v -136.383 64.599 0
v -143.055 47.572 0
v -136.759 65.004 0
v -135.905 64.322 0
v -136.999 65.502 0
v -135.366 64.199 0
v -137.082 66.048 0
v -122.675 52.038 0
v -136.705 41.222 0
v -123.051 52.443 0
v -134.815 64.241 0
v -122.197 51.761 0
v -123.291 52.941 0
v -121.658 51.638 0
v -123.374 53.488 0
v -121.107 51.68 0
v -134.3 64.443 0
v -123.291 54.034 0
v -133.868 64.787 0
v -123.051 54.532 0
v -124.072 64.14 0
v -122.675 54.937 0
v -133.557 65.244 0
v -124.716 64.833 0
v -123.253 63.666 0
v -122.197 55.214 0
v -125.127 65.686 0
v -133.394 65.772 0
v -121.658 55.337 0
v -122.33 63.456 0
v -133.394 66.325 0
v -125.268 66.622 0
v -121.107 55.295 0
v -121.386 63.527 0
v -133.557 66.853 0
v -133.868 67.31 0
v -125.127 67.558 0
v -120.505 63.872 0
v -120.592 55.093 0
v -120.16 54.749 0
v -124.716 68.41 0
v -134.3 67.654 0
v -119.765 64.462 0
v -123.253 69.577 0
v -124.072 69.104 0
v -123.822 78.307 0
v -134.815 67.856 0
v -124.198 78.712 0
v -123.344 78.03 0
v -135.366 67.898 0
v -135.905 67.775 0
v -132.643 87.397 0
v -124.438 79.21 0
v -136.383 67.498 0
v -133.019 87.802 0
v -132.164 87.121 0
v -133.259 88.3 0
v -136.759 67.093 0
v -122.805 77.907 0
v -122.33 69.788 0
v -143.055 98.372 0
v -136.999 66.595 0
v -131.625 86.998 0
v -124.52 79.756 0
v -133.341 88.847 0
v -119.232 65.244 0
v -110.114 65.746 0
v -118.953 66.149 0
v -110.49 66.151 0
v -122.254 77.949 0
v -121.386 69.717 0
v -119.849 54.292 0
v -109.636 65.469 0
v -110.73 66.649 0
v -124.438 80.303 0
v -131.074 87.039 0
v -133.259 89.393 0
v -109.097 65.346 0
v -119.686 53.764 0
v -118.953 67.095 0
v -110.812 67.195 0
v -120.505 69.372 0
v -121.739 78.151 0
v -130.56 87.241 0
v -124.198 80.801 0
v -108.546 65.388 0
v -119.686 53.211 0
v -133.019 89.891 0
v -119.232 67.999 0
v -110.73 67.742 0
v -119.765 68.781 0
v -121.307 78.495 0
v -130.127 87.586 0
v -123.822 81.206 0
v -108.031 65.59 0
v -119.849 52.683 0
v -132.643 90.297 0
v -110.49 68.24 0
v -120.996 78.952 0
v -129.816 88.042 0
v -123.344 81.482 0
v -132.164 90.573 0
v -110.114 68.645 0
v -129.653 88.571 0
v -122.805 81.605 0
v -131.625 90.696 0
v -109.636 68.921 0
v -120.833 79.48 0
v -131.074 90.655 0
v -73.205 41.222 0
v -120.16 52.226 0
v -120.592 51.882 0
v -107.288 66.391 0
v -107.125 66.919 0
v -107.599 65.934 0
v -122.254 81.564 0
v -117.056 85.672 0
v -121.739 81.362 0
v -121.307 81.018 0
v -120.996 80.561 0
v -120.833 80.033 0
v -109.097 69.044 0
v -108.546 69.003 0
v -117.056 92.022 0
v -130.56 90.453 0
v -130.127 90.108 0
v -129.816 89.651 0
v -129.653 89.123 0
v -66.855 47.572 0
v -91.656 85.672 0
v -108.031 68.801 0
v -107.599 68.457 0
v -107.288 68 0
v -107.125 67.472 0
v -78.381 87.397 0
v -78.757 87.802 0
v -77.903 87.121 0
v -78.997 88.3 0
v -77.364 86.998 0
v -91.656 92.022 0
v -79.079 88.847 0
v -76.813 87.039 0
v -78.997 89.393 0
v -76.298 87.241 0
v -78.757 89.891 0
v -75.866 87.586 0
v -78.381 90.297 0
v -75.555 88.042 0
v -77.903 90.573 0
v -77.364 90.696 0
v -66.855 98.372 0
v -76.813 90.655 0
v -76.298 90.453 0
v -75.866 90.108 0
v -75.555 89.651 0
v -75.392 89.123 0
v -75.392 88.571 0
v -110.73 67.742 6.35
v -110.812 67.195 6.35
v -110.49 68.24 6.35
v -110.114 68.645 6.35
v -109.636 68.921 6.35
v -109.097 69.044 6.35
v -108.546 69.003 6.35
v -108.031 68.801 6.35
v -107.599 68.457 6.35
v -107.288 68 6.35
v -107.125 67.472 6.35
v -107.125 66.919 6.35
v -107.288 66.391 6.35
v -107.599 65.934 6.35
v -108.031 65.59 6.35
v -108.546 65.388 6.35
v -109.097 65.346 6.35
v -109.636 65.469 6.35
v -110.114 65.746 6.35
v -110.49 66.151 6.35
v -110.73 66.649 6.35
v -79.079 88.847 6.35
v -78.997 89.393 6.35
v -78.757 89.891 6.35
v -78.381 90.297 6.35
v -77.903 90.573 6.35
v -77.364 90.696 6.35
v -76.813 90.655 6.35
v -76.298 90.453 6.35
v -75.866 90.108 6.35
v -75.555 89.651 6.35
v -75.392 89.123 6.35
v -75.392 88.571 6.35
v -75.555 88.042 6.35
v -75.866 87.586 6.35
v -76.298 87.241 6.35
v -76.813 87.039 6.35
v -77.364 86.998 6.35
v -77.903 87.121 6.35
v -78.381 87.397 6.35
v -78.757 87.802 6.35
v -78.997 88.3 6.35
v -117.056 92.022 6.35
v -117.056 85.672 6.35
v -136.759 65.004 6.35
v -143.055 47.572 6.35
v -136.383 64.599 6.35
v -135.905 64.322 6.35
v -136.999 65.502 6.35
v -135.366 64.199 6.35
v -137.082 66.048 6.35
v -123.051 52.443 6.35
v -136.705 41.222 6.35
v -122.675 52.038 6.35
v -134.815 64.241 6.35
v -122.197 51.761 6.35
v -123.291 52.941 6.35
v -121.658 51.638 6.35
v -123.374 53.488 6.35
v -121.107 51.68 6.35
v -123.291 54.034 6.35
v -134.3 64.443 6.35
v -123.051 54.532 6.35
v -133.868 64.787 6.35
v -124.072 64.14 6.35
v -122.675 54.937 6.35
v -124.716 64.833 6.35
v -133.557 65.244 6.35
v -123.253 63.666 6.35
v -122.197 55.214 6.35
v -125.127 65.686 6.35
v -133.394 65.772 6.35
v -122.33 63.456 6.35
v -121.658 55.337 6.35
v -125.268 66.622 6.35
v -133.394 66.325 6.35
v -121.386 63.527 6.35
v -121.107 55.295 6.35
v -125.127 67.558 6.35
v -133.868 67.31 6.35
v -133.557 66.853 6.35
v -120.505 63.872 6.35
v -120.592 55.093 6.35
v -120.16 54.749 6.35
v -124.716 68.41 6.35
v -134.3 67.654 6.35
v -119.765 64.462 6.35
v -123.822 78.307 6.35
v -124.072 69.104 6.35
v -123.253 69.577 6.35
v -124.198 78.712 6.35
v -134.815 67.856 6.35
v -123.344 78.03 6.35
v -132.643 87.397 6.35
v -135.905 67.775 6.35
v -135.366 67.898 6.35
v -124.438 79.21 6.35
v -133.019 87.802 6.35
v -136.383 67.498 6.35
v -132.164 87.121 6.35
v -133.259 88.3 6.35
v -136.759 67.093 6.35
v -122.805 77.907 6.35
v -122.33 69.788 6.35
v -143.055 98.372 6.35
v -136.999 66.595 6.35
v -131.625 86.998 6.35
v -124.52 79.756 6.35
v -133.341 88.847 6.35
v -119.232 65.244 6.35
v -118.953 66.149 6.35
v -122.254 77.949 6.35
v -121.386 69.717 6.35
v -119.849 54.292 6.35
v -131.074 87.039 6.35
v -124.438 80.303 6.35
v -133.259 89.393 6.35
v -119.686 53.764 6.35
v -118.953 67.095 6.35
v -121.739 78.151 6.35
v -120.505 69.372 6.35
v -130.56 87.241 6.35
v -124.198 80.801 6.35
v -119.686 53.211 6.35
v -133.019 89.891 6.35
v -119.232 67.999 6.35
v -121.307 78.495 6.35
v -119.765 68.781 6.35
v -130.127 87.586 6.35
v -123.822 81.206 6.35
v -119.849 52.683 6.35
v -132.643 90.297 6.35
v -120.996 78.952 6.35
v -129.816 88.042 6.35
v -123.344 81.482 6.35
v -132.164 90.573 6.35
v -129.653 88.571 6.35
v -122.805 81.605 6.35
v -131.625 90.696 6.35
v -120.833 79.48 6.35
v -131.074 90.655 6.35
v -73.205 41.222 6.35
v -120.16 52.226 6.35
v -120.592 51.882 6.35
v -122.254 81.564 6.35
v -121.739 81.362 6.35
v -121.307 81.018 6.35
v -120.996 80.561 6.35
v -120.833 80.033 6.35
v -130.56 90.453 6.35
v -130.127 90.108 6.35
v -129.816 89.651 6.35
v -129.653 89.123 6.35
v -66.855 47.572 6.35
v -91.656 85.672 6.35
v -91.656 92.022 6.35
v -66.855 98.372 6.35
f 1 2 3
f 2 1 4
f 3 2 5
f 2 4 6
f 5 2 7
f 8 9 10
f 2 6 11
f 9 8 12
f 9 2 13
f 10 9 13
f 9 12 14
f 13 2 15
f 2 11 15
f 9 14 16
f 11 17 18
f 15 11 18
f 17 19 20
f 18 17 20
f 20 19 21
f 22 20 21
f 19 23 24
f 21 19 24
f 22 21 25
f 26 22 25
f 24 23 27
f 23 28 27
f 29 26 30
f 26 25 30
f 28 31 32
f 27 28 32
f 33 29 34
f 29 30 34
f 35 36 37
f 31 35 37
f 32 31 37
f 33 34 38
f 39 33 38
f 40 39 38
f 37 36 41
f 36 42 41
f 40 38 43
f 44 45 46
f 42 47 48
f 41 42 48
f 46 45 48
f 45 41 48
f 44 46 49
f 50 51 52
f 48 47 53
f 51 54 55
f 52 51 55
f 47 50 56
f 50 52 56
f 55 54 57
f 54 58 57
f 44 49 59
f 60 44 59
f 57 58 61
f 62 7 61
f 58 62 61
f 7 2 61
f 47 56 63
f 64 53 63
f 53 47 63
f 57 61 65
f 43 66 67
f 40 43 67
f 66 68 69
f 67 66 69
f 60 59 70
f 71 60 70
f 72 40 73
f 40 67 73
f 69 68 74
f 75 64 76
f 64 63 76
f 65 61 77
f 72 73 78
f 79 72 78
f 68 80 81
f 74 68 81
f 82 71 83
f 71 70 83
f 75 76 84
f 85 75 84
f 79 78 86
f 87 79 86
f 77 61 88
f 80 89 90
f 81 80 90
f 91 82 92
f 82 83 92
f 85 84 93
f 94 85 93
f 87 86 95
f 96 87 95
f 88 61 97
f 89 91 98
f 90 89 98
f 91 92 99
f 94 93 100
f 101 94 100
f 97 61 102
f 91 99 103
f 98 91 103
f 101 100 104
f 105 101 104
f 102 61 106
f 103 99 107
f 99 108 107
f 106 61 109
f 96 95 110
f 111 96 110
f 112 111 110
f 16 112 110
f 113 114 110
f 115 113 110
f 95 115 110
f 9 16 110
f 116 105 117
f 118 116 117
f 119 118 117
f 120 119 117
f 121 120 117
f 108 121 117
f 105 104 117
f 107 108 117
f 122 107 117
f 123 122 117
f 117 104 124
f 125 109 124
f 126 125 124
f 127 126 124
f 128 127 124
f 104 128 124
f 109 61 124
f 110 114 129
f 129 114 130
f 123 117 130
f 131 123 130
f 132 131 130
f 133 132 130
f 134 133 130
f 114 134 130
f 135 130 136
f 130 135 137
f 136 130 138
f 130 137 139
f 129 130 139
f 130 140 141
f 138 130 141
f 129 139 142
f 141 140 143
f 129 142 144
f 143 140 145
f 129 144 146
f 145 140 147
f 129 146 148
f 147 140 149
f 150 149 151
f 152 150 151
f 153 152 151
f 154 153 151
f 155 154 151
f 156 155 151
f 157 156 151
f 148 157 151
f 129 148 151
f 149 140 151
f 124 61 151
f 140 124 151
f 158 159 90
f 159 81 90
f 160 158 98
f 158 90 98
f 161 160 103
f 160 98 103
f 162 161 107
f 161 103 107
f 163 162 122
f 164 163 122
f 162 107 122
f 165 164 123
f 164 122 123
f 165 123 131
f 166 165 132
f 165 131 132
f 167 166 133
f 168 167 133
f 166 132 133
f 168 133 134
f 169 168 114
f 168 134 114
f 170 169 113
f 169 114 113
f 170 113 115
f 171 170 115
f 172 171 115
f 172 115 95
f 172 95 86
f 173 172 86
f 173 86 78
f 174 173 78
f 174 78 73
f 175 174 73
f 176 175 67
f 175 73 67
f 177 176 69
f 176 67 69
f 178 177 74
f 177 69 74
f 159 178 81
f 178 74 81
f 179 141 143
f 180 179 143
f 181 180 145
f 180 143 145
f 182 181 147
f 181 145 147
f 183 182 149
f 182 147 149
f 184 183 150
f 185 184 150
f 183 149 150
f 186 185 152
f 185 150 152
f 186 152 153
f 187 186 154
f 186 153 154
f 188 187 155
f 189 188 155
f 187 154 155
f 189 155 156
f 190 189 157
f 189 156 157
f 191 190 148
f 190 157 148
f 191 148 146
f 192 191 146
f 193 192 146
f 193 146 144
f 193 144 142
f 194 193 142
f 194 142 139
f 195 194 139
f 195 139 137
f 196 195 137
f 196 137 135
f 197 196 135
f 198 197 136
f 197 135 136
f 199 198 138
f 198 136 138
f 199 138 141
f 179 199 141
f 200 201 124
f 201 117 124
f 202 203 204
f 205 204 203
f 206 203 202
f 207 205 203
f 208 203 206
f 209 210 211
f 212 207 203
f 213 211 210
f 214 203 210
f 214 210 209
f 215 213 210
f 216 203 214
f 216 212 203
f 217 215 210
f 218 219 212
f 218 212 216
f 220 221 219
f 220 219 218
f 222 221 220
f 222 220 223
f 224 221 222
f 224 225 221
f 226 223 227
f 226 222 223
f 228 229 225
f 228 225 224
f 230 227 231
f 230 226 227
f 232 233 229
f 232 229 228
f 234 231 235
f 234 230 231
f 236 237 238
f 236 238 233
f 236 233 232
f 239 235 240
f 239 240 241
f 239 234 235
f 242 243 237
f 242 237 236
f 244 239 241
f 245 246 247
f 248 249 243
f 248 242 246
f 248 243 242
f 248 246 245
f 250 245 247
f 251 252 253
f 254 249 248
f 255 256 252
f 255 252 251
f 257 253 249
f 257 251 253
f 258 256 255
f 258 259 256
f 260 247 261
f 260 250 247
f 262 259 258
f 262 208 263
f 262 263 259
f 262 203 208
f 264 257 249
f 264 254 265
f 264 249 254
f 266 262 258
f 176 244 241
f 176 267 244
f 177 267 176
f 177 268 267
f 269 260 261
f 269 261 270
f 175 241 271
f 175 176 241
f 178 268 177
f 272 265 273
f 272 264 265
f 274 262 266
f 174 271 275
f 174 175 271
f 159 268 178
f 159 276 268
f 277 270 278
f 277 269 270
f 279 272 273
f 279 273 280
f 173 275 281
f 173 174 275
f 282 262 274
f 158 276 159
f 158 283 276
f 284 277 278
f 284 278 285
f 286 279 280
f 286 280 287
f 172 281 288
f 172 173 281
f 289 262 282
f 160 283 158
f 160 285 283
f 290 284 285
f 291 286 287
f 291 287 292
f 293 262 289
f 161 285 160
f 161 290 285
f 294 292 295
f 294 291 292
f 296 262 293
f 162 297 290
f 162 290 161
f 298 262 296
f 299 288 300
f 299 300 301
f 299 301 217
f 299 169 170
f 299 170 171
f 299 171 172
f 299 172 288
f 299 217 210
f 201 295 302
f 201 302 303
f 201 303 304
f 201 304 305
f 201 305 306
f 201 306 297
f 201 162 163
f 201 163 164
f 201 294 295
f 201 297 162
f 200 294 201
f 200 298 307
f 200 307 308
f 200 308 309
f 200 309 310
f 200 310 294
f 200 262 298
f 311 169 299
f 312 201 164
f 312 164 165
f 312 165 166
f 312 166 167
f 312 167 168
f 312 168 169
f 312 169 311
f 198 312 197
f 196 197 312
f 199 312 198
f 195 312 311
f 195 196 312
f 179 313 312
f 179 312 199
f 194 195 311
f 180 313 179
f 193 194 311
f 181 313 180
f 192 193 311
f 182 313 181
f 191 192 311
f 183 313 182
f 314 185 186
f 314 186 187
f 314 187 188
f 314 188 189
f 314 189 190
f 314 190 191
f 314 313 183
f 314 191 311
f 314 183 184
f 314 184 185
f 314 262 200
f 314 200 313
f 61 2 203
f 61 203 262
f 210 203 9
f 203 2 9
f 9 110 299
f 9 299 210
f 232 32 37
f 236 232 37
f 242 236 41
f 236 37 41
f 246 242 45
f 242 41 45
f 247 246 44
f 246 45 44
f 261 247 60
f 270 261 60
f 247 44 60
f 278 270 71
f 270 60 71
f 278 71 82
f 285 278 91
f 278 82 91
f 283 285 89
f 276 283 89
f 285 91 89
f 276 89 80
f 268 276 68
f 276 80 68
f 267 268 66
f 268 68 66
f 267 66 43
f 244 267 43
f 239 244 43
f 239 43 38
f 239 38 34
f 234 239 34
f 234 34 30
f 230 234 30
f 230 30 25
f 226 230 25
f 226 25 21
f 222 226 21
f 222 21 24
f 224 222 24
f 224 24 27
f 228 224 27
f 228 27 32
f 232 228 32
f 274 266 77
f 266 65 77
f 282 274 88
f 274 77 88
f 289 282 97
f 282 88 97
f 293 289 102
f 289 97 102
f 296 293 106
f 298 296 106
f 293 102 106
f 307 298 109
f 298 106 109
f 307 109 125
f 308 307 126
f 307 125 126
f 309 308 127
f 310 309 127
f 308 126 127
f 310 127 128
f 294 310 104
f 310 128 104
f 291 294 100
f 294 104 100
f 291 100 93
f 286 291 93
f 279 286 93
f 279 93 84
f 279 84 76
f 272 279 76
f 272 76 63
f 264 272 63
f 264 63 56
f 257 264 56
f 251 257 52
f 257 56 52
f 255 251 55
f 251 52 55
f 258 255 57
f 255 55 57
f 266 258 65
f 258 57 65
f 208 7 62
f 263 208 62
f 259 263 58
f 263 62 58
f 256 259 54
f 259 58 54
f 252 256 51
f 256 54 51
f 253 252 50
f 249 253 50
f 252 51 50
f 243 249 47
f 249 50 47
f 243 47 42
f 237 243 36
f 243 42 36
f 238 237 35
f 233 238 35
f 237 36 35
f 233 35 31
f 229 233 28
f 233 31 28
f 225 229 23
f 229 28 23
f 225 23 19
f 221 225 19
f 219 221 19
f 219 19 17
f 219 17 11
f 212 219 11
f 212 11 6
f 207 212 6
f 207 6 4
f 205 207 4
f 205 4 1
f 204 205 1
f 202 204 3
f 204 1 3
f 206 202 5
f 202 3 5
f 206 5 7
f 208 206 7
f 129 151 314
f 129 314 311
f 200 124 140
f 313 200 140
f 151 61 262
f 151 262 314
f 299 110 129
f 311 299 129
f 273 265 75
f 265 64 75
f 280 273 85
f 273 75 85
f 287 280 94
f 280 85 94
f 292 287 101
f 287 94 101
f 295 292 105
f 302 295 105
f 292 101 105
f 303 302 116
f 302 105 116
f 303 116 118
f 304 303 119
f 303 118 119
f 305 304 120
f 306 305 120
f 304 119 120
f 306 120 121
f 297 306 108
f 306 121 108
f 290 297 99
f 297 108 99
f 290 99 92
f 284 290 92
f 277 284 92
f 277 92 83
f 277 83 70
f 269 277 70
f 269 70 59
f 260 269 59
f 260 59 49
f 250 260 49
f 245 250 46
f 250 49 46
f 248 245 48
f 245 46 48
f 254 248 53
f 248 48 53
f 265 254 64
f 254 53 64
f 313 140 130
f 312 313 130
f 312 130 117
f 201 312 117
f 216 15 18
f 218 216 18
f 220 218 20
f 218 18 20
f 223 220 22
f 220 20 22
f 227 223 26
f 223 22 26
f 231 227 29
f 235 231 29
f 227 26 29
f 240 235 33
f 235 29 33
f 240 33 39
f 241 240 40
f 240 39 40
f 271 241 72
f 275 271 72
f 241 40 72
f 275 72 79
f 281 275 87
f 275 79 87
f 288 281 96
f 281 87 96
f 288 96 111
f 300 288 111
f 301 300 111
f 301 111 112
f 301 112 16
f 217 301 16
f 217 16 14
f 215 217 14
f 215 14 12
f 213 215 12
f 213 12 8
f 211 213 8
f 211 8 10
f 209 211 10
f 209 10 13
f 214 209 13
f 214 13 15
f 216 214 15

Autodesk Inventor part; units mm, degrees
ref_plane "YZ Plane" through (0, 0, 0) normal (1, 0, 0) x (0, 1, 0)
ref_plane "XZ Plane" through (0, 0, 0) normal (0, 1, 0) x (-1, 0, 0)
ref_plane "XY Plane" through (0, 0, 0) normal (0, 0, 1) x (1, 0, 0)
sketch "Sketch1" plane through (0, 0, 0) normal (0, 0, 1) x (1, 0, 0)
  line L0 (-73.2051, 41.2219) -> (-136.7051, 41.2219)
  line L1 (-143.0551, 47.5719) -> (-143.0551, 98.3719)
  line L2 (-143.0551, 98.3719) -> (-66.8551, 98.3719)
  line L3 (-66.8551, 98.3719) -> (-66.8551, 47.5719)
  line L4 (-143.0551, 47.5719) -> (-136.7051, 41.2219)
  line L5 (-73.2051, 41.2219) -> (-66.8551, 47.5719)
  point P0 (0, 0)
  point P1 (-66.8551, 41.2219)
  point P2 (-143.0551, 41.2219)
  point P3 (-117.6551, 41.2219)
  point P4 (-143.0551, 66.6219)
  point P5 (-66.8551, 72.9719)
  point P6 (-92.2551, 41.2219)
  point P7 (-143.0551, 41.2219)
  point P8 (-66.8551, 41.2219)
  dimension "d0" = 76.2
  dimension "d1" = 57.15
  dimension "d10" = 6.35
  dimension "d11" = 6.35
  dimension "d12" = 6.35
extrude "Extrusion1" add sketch "Sketch1" along normal blind 6.35
sketch "Sketch3" plane through (0, 0, 0) normal (0, 0, -1) x (-1, 0, 0)
  arc A0 (124.5928, 66.6219) -> (120.0565, 65.1716) centre (122.0928, 66.6219) ccw projected
  line L0 (124.5928, 66.6219) -> (120.0565, 65.1716) projected
  circle A1 centre (122.0928, 66.6219) radius 11
  point P0 (0, 0)
extrude "Extrusion3" [suppressed]
sketch "Sketch4" plane through (0, 0, 0) normal (0, 0, -1) x (-1, 0, 0)
  line L0 (143.0551, 92.0219) -> (133.3409, 92.0219) construction
  line L1 (143.0551, 85.6719) -> (133.3409, 85.6719) construction
  line L2 (143.0551, 85.6719) -> (143.0551, 98.3719) construction
  line L3 (35.1051, 88.8469) -> (143.0551, 88.8469) construction
  circle A0 centre (77.2251, 88.8469) radius 1.8542
  circle A1 centre (131.4867, 88.8469) radius 1.8542
  line L4 (133.3409, 92.0219) -> (133.3409, 85.6719) projected
  point P0 (0, 0)
  dimension "d15" = 3.7084
  dimension "d16" = 3.7084
extrude "Extrusion4" cut sketch "Sketch4" against normal through all
sketch "Sketch6" plane through (0, 0, 0) normal (0, 0, -1) x (-1, 0, 0)
  circle A0 centre (122.0928, 66.6219) radius 3.175 projected
  circle A1 centre (108.9583, 67.1954) radius 1.8542 projected
  circle A2 centre (122.6662, 79.7564) radius 1.8542 projected
  circle A3 centre (135.2273, 66.0485) radius 1.8542 projected
  circle A4 centre (121.5193, 53.4875) radius 1.8542 projected
  circle A5 centre (122.0928, 66.6219) radius 19.05 construction
  point P0 (0, 0)
extrude "Extrusion6" cut sketch "Sketch6" against normal through all
sketch "Sketch7" plane through (0, 0, 0) normal (0, 0, -1) x (-1, 0, 0)
  line L0 (35.1051, 85.6719) -> (75.3709, 85.6719) projected
  line L1 (35.1051, 92.0219) -> (75.3709, 92.0219) projected
  line L2 (117.0559, 92.0219) -> (91.6559, 92.0219)
  line L3 (91.6559, 92.0219) -> (91.6559, 85.6719)
  line L4 (91.6559, 85.6719) -> (117.0559, 85.6719)
  line L5 (117.0559, 85.6719) -> (117.0559, 92.0219)
  line L6 (75.3709, 92.0219) -> (75.3709, 85.6719) projected
  line L7 (35.1051, 85.6719) -> (35.1051, 92.0219) projected
  point P0 (0, 0)
  dimension "d23" = 25.4
extrude "Extrusion7" cut sketch "Sketch7" against normal through all contours L5 L4 L3 L2
equation "\"d10\" = d9"
equation "\"d12\" = d11"
equation "\"d9\" = 6.35"
properties part number "projectorMountSide_RB01" material "Nylon, molybdenum disulphide"
